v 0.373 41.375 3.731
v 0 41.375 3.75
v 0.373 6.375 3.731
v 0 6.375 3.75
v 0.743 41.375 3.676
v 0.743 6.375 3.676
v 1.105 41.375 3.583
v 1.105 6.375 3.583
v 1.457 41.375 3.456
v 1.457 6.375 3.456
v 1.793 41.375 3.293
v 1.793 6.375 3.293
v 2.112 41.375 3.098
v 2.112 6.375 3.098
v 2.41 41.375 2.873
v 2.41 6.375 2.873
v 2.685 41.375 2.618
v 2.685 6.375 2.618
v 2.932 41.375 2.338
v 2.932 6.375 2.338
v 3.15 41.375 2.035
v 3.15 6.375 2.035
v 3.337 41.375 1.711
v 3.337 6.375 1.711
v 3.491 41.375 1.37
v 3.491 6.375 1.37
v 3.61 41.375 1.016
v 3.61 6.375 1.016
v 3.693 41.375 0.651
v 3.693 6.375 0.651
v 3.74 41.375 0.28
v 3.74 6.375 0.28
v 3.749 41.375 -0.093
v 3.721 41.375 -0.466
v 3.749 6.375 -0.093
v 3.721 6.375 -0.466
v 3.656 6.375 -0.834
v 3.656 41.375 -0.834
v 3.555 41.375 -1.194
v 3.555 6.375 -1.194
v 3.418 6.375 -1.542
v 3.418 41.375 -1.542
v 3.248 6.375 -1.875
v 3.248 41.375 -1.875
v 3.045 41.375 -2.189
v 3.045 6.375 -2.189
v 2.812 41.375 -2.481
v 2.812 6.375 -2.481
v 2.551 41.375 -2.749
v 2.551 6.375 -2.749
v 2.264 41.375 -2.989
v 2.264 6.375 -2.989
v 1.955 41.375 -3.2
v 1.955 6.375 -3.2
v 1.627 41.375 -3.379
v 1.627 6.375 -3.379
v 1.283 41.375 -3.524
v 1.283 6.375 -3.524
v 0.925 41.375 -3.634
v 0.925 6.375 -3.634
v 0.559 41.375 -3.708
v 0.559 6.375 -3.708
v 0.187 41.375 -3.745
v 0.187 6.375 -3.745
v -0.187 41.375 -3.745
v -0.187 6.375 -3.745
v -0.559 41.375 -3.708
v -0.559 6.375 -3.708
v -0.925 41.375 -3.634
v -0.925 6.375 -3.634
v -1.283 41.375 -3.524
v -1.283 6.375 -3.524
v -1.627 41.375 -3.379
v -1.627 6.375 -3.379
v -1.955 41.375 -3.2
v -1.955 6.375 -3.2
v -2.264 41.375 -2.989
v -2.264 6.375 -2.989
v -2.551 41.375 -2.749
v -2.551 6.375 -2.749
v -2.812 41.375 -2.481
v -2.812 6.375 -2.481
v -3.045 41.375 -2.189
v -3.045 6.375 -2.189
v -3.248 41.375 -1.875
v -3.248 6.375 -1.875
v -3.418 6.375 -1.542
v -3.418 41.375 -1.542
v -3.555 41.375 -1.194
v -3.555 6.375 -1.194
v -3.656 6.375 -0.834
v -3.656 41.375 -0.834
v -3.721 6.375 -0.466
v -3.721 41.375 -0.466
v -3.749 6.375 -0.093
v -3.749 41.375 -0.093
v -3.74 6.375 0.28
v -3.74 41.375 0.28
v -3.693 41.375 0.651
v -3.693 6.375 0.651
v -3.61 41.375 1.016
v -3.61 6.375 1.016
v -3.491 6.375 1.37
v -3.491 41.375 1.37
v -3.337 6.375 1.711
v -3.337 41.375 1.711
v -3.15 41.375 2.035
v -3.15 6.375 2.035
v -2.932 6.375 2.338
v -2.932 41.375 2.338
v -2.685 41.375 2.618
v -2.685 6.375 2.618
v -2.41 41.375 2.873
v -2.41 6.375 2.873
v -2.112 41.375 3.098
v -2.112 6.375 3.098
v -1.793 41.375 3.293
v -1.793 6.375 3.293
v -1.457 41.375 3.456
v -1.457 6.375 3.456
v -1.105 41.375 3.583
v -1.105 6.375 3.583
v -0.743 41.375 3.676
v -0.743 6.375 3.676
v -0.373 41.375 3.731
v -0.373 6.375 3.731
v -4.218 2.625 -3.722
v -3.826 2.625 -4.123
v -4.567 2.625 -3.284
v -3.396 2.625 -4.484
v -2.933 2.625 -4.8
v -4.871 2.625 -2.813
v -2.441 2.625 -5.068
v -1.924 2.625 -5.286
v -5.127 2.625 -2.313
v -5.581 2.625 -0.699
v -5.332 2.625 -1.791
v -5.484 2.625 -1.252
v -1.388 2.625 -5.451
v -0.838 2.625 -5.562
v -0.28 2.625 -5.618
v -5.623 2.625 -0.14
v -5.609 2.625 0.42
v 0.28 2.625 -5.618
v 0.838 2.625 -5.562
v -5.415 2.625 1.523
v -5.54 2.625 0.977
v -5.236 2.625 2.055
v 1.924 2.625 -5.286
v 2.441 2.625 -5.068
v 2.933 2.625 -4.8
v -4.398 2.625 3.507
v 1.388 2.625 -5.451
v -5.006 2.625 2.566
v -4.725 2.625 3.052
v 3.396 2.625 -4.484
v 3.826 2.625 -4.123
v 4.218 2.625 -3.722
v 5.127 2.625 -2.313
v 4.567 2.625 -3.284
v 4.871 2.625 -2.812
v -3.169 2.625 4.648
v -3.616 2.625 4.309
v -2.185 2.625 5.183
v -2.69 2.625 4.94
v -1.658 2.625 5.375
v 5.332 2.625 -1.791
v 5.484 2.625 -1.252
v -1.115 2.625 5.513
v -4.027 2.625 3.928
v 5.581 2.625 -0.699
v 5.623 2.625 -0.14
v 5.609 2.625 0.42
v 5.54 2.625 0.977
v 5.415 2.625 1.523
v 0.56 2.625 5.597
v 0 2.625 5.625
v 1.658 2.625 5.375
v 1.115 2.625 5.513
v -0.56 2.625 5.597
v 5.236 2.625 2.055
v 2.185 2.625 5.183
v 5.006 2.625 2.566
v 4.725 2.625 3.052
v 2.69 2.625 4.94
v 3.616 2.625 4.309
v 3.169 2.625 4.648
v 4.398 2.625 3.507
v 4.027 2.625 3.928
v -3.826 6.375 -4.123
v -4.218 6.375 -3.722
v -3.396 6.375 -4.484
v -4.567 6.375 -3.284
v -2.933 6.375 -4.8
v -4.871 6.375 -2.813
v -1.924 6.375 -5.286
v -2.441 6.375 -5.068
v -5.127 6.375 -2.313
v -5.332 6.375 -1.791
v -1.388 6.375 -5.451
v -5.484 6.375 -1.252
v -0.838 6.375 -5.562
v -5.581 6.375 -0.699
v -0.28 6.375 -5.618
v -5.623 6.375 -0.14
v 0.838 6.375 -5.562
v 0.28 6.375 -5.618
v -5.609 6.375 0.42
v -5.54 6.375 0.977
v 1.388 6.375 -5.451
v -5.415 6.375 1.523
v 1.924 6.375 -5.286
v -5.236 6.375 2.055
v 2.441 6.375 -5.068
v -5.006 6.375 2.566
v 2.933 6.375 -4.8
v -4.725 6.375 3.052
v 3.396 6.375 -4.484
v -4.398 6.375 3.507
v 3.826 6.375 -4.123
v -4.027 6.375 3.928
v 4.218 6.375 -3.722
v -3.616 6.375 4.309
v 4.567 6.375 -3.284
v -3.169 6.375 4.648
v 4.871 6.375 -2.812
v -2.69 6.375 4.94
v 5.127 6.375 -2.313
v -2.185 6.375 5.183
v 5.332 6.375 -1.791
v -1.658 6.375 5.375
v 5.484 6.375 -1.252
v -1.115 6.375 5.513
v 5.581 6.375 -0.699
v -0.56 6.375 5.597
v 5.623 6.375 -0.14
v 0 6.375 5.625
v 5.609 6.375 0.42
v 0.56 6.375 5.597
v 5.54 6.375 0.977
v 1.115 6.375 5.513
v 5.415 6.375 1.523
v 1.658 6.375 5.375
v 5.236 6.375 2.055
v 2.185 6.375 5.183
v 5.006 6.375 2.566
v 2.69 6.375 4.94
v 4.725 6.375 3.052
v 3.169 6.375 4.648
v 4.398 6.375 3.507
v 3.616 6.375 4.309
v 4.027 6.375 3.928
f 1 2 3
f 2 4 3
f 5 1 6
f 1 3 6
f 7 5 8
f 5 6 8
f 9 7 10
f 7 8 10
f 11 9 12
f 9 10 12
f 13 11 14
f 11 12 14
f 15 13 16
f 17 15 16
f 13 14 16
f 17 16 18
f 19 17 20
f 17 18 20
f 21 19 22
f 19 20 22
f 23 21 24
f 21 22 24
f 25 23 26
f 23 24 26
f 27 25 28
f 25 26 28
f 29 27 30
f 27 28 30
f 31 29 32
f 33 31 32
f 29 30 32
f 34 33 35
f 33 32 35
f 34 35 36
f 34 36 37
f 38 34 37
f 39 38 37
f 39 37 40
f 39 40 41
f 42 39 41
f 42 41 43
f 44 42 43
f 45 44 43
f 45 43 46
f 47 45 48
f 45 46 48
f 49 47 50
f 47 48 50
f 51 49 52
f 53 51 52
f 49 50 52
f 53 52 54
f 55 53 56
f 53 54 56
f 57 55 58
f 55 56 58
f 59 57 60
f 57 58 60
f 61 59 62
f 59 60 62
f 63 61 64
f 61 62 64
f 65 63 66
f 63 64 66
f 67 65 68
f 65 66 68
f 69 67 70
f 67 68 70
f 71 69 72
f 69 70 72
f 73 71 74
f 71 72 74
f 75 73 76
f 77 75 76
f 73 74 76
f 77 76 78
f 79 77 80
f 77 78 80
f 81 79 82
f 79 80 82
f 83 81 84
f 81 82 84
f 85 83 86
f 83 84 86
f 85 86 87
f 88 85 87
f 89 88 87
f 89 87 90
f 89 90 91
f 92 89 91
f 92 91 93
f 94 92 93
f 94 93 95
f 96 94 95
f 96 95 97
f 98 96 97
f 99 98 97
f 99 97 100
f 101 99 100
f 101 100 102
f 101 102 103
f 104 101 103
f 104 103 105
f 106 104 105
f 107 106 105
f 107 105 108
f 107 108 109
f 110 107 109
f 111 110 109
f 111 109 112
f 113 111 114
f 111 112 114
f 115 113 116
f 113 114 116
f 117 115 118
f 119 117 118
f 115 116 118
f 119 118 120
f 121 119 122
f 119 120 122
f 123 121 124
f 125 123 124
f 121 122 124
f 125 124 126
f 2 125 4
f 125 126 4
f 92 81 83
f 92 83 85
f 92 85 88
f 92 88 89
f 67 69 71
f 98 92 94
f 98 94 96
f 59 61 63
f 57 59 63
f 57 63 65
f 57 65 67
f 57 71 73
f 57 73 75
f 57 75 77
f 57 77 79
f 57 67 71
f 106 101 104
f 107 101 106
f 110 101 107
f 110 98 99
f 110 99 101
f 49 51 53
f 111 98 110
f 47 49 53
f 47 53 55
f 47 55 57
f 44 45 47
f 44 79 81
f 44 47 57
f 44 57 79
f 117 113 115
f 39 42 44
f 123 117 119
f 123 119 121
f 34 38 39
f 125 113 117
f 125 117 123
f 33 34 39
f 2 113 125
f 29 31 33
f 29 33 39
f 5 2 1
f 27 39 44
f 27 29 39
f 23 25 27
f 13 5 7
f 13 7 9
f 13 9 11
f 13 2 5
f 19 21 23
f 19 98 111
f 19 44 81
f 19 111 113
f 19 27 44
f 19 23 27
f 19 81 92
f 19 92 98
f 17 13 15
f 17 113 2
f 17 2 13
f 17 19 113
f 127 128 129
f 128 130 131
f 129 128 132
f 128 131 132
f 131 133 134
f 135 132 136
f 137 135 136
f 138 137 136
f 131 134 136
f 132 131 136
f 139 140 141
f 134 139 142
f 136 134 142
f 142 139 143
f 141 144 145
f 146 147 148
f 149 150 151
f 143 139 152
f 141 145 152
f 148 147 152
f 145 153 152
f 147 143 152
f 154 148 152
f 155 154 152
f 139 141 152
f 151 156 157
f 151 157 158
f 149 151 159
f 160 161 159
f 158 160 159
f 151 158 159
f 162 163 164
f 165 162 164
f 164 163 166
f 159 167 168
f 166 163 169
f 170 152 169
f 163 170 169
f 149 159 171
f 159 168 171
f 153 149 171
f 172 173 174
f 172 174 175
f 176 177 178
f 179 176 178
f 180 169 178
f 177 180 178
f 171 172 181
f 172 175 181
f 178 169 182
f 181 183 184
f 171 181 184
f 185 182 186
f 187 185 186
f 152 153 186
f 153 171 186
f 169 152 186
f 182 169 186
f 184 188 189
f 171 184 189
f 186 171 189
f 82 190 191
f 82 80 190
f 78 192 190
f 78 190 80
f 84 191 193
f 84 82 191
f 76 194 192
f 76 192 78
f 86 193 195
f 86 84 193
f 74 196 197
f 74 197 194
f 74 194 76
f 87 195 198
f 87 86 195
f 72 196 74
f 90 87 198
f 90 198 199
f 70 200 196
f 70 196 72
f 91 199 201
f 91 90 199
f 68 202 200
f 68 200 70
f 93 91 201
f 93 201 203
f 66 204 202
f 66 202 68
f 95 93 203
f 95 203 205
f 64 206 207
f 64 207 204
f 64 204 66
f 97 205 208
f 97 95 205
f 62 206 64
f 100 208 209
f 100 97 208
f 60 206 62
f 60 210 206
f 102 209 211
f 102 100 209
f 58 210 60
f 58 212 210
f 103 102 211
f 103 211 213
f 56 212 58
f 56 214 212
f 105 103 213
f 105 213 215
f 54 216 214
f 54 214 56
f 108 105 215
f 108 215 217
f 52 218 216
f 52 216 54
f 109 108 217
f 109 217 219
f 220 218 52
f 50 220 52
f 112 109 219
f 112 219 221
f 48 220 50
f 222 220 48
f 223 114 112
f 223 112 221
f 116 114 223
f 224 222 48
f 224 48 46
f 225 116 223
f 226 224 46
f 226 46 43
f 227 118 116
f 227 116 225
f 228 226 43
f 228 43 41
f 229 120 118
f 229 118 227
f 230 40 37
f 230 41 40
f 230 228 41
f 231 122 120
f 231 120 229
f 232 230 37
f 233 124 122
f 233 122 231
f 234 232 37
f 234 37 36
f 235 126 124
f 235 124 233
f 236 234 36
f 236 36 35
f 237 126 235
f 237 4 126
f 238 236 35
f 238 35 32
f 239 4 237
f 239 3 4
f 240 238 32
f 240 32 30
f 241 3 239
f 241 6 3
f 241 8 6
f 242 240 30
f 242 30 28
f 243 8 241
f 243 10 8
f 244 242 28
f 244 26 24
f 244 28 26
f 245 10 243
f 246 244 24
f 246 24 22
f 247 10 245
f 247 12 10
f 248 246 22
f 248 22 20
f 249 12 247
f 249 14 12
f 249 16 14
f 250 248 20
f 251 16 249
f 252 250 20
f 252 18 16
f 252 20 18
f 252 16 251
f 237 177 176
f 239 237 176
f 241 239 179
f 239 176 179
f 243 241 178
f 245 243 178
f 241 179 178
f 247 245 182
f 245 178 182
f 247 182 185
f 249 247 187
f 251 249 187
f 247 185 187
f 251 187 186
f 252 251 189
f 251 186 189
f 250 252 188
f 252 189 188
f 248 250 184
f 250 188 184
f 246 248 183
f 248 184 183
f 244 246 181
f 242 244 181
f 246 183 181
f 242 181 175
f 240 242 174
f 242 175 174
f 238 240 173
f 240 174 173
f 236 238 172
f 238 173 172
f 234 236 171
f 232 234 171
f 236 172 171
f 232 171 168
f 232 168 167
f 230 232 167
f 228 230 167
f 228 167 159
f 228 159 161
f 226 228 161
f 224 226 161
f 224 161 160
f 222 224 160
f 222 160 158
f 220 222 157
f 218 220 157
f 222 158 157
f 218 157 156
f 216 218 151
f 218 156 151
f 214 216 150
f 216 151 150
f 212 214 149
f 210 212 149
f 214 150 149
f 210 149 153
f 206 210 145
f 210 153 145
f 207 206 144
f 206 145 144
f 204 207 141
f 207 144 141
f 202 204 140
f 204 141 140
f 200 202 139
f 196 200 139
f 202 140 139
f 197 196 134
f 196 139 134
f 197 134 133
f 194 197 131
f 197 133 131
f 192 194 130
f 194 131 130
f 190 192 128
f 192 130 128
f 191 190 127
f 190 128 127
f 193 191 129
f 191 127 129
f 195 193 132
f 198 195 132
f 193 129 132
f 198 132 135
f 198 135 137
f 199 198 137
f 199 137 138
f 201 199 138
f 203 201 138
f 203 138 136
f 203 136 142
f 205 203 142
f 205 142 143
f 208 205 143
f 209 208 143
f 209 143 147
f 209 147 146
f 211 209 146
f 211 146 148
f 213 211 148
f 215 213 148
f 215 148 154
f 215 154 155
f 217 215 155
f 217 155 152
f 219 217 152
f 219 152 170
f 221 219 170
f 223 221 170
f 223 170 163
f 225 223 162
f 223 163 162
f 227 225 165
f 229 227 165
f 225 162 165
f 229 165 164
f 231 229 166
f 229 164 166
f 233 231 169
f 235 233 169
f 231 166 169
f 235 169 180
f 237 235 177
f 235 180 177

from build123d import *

# Parameters (mm, degrees)
CROQUIS1_R              = 7.5
SALIENTE_EXTRUIR1_DEPTH = 5
CROQUIS2_R              = 5
SALIENTE_EXTRUIR2_DEPTH = 20
ESCALA1_SCALE           = 0.75
CROQUIS4_R              = 3.75
SALIENTE_EXTRUIR3_DEPTH = 20


with BuildPart() as part:
    # Croquis1 → Saliente-Extruir1 (new body)
    with BuildSketch(Plane(origin=(0, 0, 0), x_dir=(1, 0, 0), z_dir=(0, 1, 0))):
        with Locations(Location((0, 0, 0), (0, 0, 270))):
            Circle(CROQUIS1_R)
    extrude(amount=SALIENTE_EXTRUIR1_DEPTH)

    # Croquis2 → Saliente-Extruir2 (add)
    with BuildSketch(Plane(origin=(0, 5, 0), x_dir=(1, 0, 0), z_dir=(0, 1, 0))):
        with Locations(Location((0, 0, 0), (0, 0, 270))):
            Circle(CROQUIS2_R)
    extrude(amount=SALIENTE_EXTRUIR2_DEPTH)


with BuildPart() as part_1:
    # Escala1: scaled about (0, 10.5, 0)
    add(part.part.scale(ESCALA1_SCALE).moved(Location((0, 2.625, 0))))

    # Croquis4 → Saliente-Extruir3 (add)
    with BuildSketch(Plane(origin=(0, 21.375, 0), x_dir=(1, 0, 0), z_dir=(0, 1, 0))):
        with Locations(Location((0, 0, 0), (0, 0, 270))):
            Circle(CROQUIS4_R)
    extrude(amount=SALIENTE_EXTRUIR3_DEPTH)


solid = part_1.part
